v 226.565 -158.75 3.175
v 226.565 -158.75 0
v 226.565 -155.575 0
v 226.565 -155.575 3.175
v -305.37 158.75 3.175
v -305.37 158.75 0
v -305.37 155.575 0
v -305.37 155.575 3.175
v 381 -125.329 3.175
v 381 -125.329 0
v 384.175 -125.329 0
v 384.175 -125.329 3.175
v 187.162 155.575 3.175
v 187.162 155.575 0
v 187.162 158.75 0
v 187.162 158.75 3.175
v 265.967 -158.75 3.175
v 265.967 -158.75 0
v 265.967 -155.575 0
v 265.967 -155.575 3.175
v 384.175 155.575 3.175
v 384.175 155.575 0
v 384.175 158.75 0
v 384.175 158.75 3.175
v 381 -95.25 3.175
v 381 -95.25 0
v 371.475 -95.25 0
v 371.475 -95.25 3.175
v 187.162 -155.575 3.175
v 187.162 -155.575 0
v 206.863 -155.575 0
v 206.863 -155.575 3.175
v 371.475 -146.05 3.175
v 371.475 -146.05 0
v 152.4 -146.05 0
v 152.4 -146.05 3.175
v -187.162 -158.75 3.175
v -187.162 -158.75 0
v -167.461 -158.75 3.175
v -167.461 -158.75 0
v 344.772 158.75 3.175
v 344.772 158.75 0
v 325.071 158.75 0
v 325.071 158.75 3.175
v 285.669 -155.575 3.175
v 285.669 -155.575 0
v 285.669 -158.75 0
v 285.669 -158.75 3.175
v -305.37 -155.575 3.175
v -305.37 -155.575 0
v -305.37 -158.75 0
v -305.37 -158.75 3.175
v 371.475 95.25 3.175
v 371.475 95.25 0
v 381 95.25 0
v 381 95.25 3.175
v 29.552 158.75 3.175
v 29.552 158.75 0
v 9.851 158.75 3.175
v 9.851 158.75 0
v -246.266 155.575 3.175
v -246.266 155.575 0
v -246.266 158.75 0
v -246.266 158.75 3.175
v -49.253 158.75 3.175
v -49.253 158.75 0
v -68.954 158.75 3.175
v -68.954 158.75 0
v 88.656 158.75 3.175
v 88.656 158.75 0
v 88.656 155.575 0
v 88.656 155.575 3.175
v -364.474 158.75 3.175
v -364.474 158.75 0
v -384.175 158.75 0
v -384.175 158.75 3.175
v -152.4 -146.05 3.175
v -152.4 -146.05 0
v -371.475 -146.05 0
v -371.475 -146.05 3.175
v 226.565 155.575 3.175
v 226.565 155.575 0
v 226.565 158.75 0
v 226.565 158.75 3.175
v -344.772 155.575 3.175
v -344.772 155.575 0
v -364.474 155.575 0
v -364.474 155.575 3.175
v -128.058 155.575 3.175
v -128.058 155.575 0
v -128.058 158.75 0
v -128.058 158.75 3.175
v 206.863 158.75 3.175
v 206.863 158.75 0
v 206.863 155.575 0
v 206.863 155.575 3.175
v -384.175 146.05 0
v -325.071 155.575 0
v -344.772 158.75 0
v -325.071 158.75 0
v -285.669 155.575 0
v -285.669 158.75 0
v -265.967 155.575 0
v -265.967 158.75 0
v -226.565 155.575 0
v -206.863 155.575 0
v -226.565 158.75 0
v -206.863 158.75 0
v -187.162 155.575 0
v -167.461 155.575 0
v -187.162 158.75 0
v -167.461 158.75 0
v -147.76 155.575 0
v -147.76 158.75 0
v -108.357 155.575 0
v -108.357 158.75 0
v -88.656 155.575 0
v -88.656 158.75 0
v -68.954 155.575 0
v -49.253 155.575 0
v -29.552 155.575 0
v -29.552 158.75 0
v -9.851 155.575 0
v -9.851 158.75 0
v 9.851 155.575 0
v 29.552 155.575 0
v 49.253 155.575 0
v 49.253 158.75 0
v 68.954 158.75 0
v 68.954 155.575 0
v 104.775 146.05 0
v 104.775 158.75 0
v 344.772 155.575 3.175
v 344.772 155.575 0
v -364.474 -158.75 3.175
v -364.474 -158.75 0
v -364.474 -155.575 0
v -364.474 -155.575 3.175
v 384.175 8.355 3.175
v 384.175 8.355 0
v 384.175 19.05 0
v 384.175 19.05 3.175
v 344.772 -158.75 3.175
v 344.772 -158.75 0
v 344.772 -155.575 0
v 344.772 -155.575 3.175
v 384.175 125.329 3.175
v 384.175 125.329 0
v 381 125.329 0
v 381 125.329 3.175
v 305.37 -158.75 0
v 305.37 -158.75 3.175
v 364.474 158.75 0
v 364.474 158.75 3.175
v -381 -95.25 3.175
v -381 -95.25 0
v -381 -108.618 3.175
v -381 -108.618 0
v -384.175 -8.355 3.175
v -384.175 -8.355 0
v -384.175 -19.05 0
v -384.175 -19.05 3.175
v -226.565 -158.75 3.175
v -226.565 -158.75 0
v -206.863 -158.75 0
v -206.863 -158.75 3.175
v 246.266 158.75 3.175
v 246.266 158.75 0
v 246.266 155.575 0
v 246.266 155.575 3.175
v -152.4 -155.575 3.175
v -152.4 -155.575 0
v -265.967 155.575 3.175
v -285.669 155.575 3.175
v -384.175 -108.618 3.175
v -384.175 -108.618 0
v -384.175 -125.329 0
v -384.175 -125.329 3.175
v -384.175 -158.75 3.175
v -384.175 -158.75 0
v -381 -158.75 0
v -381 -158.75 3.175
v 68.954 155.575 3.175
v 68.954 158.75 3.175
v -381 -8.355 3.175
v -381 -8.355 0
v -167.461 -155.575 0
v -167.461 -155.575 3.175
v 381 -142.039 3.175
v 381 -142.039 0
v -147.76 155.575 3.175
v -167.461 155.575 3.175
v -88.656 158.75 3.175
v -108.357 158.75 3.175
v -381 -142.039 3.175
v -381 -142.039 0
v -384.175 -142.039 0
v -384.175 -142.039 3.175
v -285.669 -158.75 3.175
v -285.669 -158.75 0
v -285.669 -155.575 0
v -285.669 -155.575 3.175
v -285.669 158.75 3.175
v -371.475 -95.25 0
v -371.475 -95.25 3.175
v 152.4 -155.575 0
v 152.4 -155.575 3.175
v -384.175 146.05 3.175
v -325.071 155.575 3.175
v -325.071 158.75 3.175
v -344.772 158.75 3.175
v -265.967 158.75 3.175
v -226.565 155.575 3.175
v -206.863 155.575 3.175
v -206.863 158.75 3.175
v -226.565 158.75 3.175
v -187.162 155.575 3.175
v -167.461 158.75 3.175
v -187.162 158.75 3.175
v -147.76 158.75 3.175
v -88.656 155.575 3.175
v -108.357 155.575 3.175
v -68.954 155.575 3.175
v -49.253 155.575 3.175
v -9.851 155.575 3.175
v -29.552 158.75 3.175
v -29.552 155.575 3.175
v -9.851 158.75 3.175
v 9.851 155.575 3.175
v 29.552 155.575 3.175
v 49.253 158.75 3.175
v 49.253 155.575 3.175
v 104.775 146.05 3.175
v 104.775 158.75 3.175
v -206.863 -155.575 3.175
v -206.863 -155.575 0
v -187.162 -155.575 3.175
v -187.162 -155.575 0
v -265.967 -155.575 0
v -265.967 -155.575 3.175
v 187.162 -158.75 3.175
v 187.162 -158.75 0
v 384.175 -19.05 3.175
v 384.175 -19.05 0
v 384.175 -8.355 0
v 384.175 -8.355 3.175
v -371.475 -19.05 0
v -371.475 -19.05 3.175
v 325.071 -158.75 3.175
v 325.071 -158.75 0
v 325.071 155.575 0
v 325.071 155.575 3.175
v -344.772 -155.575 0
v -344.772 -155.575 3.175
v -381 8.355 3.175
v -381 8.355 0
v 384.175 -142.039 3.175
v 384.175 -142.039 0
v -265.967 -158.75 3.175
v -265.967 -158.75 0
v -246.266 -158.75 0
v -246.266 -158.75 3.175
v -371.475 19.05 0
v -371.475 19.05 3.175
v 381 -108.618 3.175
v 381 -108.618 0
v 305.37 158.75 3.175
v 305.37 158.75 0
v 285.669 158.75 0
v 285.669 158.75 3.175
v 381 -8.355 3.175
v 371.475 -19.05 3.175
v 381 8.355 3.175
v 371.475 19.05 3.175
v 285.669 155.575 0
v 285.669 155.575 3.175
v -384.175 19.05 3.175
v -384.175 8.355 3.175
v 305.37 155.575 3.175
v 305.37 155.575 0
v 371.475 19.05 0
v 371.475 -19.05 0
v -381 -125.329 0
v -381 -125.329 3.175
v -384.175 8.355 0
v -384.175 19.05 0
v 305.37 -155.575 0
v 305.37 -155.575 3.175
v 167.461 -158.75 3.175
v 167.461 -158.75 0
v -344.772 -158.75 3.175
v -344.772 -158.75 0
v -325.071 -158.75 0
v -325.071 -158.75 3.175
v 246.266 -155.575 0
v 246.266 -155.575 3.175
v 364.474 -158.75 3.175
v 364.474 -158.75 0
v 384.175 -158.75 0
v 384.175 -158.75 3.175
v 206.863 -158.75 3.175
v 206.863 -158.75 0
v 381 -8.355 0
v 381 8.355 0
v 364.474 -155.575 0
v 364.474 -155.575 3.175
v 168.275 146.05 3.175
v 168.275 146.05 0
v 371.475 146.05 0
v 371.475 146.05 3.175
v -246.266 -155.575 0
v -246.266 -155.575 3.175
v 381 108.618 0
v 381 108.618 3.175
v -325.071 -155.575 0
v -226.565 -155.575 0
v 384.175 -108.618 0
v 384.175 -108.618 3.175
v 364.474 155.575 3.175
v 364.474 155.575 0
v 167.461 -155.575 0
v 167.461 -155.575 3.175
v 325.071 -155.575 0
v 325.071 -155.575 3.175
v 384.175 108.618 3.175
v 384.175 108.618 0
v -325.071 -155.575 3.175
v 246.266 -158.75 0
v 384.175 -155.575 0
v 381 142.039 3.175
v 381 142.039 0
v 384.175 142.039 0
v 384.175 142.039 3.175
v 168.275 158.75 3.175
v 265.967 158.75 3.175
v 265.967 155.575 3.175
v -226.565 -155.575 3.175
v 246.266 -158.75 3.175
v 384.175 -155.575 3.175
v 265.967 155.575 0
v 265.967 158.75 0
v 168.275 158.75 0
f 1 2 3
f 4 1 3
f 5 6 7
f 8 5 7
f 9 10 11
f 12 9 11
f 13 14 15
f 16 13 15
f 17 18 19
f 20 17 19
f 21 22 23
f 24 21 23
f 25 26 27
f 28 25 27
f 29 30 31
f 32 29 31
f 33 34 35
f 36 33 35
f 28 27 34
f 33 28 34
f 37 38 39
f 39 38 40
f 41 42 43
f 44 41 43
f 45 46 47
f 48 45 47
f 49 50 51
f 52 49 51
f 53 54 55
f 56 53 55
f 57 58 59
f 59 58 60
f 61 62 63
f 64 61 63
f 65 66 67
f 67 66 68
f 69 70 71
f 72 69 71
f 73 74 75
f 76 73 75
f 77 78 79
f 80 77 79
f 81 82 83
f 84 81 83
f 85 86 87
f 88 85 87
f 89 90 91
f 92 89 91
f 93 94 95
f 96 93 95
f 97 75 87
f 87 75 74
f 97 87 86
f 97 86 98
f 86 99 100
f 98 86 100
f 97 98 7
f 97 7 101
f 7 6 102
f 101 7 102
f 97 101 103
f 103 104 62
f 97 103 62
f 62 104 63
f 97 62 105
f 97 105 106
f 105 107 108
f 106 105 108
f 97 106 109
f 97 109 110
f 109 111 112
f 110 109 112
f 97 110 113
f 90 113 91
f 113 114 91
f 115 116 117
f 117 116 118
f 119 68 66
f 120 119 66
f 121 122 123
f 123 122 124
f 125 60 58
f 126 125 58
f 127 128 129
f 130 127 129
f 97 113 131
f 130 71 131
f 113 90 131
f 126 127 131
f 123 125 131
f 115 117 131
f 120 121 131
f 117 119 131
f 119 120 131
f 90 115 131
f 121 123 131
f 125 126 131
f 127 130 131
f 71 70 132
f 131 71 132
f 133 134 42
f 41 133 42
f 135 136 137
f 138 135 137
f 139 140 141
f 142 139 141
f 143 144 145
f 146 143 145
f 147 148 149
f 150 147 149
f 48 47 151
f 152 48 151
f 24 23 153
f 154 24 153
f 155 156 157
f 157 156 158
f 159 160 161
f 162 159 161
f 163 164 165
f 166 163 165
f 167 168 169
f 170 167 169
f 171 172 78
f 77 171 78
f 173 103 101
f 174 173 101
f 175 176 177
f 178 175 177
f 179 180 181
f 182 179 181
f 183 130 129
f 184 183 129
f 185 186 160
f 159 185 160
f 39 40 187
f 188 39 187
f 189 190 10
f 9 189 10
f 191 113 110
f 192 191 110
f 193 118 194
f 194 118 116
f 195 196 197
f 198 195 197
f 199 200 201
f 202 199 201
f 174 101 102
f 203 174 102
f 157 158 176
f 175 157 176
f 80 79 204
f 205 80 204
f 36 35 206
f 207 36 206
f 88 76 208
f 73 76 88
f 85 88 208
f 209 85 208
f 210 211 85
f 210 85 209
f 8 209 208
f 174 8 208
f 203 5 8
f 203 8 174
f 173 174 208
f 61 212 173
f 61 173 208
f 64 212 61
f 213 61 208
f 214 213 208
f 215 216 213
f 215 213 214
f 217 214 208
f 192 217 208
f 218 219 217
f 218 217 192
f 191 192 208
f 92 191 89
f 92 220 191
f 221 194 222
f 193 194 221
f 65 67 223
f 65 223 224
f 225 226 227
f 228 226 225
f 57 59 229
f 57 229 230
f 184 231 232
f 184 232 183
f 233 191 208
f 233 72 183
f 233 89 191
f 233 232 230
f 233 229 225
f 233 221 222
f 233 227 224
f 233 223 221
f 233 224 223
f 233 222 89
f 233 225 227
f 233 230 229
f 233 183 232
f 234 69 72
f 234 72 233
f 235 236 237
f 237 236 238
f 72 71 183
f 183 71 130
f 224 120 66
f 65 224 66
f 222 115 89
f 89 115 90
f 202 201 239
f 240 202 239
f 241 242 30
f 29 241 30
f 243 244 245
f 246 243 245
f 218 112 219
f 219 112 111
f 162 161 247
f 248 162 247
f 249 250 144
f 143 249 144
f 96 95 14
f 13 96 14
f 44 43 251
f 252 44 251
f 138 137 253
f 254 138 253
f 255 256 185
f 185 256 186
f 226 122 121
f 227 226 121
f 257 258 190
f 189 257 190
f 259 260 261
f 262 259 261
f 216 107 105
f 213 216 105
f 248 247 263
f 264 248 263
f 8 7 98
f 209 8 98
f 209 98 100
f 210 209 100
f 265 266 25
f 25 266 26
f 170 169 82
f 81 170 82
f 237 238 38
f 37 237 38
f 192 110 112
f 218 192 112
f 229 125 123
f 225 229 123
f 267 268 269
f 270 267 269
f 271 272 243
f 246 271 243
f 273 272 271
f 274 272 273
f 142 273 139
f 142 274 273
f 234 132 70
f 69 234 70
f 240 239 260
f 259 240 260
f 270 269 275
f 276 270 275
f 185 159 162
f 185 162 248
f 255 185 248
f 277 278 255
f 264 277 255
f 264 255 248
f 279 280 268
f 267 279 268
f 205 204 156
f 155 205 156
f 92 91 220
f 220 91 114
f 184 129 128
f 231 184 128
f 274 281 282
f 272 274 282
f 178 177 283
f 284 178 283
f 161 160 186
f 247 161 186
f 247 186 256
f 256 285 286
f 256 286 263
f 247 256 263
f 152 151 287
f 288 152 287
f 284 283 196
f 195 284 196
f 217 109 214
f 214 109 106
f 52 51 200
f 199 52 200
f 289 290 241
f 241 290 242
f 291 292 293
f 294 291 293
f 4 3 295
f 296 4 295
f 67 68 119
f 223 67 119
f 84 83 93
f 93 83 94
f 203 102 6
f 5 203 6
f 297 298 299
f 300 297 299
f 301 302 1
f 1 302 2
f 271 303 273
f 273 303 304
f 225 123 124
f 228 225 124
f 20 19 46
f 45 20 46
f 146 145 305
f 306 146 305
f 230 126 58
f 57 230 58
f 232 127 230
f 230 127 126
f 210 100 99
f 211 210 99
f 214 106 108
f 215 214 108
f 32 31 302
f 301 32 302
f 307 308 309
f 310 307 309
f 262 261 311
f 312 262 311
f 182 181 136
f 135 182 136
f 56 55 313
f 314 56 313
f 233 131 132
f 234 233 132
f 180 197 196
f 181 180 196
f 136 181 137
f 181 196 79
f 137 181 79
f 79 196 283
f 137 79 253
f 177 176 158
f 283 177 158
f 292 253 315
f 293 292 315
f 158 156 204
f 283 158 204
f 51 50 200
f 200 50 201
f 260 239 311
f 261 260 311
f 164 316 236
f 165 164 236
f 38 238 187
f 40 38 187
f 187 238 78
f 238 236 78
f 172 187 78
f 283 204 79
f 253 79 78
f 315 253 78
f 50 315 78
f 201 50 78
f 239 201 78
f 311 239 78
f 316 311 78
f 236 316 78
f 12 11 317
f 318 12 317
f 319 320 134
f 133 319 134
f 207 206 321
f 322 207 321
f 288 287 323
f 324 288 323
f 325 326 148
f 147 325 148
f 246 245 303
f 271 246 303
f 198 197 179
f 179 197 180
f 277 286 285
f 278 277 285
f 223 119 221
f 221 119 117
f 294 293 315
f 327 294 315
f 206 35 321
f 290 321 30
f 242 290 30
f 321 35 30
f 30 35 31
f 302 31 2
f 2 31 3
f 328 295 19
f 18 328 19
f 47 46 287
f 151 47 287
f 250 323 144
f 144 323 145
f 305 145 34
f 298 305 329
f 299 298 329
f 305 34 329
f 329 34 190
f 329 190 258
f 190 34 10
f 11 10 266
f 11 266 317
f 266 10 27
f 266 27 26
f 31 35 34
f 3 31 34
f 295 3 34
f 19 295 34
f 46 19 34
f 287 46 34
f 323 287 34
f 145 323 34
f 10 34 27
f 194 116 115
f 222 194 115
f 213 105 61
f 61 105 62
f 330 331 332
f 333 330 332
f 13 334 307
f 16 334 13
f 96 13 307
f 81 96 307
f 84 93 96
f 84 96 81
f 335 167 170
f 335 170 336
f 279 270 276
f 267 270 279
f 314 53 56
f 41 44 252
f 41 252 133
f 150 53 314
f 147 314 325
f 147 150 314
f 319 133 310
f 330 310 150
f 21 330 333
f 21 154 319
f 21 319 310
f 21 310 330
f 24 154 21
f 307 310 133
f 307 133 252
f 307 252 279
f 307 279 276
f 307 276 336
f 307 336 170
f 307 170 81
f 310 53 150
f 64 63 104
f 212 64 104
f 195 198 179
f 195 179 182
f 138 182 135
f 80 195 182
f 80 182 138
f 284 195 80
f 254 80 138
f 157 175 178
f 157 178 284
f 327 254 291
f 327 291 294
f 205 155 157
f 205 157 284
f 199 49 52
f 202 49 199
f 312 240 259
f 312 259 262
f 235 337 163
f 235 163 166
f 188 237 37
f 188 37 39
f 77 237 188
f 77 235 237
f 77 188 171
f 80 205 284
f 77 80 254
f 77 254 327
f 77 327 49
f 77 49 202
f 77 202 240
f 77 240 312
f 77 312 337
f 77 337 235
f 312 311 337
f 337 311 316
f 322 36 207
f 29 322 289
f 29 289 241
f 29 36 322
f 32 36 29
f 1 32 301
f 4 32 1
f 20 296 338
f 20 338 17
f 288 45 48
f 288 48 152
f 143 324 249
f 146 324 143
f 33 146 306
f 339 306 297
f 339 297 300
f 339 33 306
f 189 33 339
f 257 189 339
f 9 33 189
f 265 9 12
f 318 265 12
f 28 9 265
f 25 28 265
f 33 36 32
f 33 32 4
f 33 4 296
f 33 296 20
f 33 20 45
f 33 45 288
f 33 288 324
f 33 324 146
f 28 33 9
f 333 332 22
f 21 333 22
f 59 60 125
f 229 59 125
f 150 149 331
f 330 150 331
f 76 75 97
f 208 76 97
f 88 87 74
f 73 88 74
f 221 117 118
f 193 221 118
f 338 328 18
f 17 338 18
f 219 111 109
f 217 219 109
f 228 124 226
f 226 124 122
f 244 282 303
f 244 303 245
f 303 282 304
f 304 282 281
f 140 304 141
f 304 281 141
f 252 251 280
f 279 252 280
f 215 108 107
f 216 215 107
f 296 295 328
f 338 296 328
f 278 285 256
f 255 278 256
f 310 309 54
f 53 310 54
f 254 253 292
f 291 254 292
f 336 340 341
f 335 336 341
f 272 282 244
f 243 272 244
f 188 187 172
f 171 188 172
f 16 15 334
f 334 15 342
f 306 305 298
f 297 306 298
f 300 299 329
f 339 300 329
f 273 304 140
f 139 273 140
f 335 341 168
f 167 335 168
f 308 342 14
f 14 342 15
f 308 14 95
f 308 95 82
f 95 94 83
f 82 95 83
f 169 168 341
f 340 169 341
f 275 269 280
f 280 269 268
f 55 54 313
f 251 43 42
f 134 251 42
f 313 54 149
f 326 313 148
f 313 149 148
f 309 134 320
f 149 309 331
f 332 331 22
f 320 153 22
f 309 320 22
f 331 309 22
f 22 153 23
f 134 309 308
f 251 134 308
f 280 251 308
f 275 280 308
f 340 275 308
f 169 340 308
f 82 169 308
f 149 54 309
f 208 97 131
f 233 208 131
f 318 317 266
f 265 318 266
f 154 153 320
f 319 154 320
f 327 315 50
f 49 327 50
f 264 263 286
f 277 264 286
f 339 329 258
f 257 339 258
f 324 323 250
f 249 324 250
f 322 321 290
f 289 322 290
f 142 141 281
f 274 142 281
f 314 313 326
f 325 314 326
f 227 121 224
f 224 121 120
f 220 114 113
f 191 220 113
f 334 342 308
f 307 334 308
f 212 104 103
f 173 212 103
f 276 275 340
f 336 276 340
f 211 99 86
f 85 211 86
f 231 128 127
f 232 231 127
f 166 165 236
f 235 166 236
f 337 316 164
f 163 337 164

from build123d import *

# Parameters (mm, degrees)
F1_DEPTH = 3.175


# Not quite as in the source:
# - ends of sketch curves that miss each other by under 0.0002 mm in the source are joined


with BuildPart() as f1:
    # F0 (on Top) → F1 (new body)
    with BuildSketch(Plane.XY):
        Polygon((168.275, 158.75), (168.275, 146.05), (371.475, 146.05), (371.475, 95.25), (381, 95.25), (381, 108.618420812), (384.175, 108.618420812), (384.175, 125.328947208), (381, 125.328947208), (381, 142.039473604), (384.175, 142.039473604), (384.175, 155.575), (384.175004318, 158.75), (364.473722156, 158.75), (364.473722156, 155.575), (344.772439994, 155.575), (344.772439994, 158.75), (325.071157832, 158.75), (325.071157832, 155.575), (305.36987567, 155.575), (305.36987567, 158.75), (285.668593508, 158.75), (285.668593508, 155.575), (268.605, 155.575), (265.967311346, 155.575), (265.967311346, 158.75), (246.266029184, 158.75), (246.266029184, 155.575), (226.564747022, 155.575), (226.564747022, 158.75), (206.86346486, 158.75), (206.86346486, 155.575), (187.162182698, 155.575), (187.162182698, 158.75), align=None)
    extrude(amount=F1_DEPTH)


with BuildPart() as f1b:
    # F0 (on Top) → F1, piece 2 (new body)
    with BuildSketch(Plane.XY):
        Polygon((-364.473717838, 158.75), (-384.175, 158.75), (-384.175, 146.05), (-371.475, 146.05), (-317.7820146084, 146.05), (104.775, 146.05), (104.775, 158.75), (88.655771888, 158.75), (88.655771888, 155.575), (68.954489726, 155.575), (68.954489726, 158.75), (49.253207564, 158.75), (49.253207564, 155.575), (29.551925402, 155.575), (29.551925402, 158.75), (9.85064324, 158.75), (9.85064324, 155.575), (-9.850638922, 155.575), (-9.850638922, 158.75), (-29.551921084, 158.75), (-29.551921084, 155.575), (-49.253203246, 155.575), (-49.253203246, 158.75), (-68.954485408, 158.75), (-68.954485408, 155.575), (-88.65576757, 155.575), (-88.65576757, 158.75), (-108.357049732, 158.75), (-108.357049732, 155.575), (-128.058331894, 155.575), (-128.058331894, 158.75), (-147.759614056, 158.75), (-147.759614056, 155.575), (-167.460896218, 155.575), (-167.460896218, 158.75), (-187.16217838, 158.75), (-187.16217838, 155.575), (-206.863460542, 155.575), (-206.863460542, 158.75), (-226.564742704, 158.75), (-226.564742704, 155.575), (-246.266024866, 155.575), (-246.266024866, 158.75), (-265.967307028, 158.75), (-265.967307028, 155.575), (-285.66858919, 155.575), (-285.66858919, 158.75), (-305.369871352, 158.75), (-305.369871352, 155.575), (-325.071153514, 155.575), (-325.071153514, 158.75), (-344.772435676, 158.75), (-344.772435676, 155.575), (-364.473717838, 155.575), align=None)
    extrude(amount=F1_DEPTH)


with BuildPart() as f1c:
    # F0 (on Top) → F1, piece 3 (new body)
    with BuildSketch(Plane.XY):
        Polygon((-371.475, -19.05), (-371.475, 19.05), (-384.175, 19.05), (-384.175, 8.355262436), (-381, 8.355262436), (-381, -8.35526396), (-384.175, -8.35526396), (-384.175, -19.05), align=None)
    extrude(amount=F1_DEPTH)


with BuildPart() as f1d:
    # F0 (on Top) → F1, piece 4 (new body)
    with BuildSketch(Plane.XY):
        Polygon((-371.475, -146.05), (-371.475, -95.25), (-381, -95.25), (-381, -108.618422336), (-384.175, -108.618422336), (-384.175, -125.328948732), (-381, -125.328948732), (-381, -142.039475128), (-384.175, -142.039475128), (-384.175, -158.750001524), (-381, -158.750001524), (-364.473717838, -158.75), (-364.473717838, -155.575), (-344.772435676, -155.575), (-344.772435676, -158.75), (-325.071153514, -158.75), (-325.071153514, -155.575), (-305.369871352, -155.575), (-305.369871352, -158.75), (-285.66858919, -158.75), (-285.66858919, -155.575), (-265.967307028, -155.575), (-265.967307028, -158.75), (-246.266024866, -158.75), (-246.266024866, -155.575), (-226.564742704, -155.575), (-226.564742704, -158.75), (-206.863460542, -158.75), (-206.863460542, -155.575), (-187.16217838, -155.575), (-187.16217838, -158.75), (-167.460896218, -158.75), (-167.460896218, -155.575), (-152.4, -155.575), (-152.4, -146.05), align=None)
    extrude(amount=F1_DEPTH)


with BuildPart() as f1e:
    # F0 (on Top) → F1, piece 5 (new body)
    with BuildSketch(Plane.XY):
        Polygon((384.175, 19.05), (371.475, 19.05), (371.475, -19.05), (384.175, -19.05), (384.175, -8.35526396), (381, -8.35526396), (381, 8.355262436), (384.175, 8.355262436), align=None)
    extrude(amount=F1_DEPTH)


with BuildPart() as f1f:
    # F0 (on Top) → F1, piece 6 (new body)
    with BuildSketch(Plane.XY):
        Polygon((371.475, -146.05), (152.4, -146.05), (152.4, -155.575), (167.460900536, -155.575), (167.460900536, -158.75), (187.162182698, -158.75), (187.162182698, -155.575), (206.86346486, -155.575), (206.86346486, -158.75), (226.564747022, -158.75), (226.564747022, -155.575), (246.266029184, -155.575), (246.266029184, -158.75), (265.967311346, -158.75), (265.967311346, -155.575), (285.668593508, -155.575), (285.668593508, -158.75), (305.36987567, -158.75), (305.36987567, -155.575), (325.071157832, -155.575), (325.071157832, -158.75), (344.772439994, -158.75), (344.772439994, -155.575), (364.473722156, -155.575), (364.473722156, -158.75), (381, -158.75), (384.175004318, -158.75), (384.175004318, -155.575), (384.175, -142.039475128), (381, -142.039475128), (381, -125.328948732), (384.175, -125.328948732), (384.175, -108.618422336), (381, -108.618422336), (381, -95.25), (371.475, -95.25), align=None)
    extrude(amount=F1_DEPTH)


solid = Compound([f1.part, f1b.part, f1c.part, f1d.part, f1e.part, f1f.part])
